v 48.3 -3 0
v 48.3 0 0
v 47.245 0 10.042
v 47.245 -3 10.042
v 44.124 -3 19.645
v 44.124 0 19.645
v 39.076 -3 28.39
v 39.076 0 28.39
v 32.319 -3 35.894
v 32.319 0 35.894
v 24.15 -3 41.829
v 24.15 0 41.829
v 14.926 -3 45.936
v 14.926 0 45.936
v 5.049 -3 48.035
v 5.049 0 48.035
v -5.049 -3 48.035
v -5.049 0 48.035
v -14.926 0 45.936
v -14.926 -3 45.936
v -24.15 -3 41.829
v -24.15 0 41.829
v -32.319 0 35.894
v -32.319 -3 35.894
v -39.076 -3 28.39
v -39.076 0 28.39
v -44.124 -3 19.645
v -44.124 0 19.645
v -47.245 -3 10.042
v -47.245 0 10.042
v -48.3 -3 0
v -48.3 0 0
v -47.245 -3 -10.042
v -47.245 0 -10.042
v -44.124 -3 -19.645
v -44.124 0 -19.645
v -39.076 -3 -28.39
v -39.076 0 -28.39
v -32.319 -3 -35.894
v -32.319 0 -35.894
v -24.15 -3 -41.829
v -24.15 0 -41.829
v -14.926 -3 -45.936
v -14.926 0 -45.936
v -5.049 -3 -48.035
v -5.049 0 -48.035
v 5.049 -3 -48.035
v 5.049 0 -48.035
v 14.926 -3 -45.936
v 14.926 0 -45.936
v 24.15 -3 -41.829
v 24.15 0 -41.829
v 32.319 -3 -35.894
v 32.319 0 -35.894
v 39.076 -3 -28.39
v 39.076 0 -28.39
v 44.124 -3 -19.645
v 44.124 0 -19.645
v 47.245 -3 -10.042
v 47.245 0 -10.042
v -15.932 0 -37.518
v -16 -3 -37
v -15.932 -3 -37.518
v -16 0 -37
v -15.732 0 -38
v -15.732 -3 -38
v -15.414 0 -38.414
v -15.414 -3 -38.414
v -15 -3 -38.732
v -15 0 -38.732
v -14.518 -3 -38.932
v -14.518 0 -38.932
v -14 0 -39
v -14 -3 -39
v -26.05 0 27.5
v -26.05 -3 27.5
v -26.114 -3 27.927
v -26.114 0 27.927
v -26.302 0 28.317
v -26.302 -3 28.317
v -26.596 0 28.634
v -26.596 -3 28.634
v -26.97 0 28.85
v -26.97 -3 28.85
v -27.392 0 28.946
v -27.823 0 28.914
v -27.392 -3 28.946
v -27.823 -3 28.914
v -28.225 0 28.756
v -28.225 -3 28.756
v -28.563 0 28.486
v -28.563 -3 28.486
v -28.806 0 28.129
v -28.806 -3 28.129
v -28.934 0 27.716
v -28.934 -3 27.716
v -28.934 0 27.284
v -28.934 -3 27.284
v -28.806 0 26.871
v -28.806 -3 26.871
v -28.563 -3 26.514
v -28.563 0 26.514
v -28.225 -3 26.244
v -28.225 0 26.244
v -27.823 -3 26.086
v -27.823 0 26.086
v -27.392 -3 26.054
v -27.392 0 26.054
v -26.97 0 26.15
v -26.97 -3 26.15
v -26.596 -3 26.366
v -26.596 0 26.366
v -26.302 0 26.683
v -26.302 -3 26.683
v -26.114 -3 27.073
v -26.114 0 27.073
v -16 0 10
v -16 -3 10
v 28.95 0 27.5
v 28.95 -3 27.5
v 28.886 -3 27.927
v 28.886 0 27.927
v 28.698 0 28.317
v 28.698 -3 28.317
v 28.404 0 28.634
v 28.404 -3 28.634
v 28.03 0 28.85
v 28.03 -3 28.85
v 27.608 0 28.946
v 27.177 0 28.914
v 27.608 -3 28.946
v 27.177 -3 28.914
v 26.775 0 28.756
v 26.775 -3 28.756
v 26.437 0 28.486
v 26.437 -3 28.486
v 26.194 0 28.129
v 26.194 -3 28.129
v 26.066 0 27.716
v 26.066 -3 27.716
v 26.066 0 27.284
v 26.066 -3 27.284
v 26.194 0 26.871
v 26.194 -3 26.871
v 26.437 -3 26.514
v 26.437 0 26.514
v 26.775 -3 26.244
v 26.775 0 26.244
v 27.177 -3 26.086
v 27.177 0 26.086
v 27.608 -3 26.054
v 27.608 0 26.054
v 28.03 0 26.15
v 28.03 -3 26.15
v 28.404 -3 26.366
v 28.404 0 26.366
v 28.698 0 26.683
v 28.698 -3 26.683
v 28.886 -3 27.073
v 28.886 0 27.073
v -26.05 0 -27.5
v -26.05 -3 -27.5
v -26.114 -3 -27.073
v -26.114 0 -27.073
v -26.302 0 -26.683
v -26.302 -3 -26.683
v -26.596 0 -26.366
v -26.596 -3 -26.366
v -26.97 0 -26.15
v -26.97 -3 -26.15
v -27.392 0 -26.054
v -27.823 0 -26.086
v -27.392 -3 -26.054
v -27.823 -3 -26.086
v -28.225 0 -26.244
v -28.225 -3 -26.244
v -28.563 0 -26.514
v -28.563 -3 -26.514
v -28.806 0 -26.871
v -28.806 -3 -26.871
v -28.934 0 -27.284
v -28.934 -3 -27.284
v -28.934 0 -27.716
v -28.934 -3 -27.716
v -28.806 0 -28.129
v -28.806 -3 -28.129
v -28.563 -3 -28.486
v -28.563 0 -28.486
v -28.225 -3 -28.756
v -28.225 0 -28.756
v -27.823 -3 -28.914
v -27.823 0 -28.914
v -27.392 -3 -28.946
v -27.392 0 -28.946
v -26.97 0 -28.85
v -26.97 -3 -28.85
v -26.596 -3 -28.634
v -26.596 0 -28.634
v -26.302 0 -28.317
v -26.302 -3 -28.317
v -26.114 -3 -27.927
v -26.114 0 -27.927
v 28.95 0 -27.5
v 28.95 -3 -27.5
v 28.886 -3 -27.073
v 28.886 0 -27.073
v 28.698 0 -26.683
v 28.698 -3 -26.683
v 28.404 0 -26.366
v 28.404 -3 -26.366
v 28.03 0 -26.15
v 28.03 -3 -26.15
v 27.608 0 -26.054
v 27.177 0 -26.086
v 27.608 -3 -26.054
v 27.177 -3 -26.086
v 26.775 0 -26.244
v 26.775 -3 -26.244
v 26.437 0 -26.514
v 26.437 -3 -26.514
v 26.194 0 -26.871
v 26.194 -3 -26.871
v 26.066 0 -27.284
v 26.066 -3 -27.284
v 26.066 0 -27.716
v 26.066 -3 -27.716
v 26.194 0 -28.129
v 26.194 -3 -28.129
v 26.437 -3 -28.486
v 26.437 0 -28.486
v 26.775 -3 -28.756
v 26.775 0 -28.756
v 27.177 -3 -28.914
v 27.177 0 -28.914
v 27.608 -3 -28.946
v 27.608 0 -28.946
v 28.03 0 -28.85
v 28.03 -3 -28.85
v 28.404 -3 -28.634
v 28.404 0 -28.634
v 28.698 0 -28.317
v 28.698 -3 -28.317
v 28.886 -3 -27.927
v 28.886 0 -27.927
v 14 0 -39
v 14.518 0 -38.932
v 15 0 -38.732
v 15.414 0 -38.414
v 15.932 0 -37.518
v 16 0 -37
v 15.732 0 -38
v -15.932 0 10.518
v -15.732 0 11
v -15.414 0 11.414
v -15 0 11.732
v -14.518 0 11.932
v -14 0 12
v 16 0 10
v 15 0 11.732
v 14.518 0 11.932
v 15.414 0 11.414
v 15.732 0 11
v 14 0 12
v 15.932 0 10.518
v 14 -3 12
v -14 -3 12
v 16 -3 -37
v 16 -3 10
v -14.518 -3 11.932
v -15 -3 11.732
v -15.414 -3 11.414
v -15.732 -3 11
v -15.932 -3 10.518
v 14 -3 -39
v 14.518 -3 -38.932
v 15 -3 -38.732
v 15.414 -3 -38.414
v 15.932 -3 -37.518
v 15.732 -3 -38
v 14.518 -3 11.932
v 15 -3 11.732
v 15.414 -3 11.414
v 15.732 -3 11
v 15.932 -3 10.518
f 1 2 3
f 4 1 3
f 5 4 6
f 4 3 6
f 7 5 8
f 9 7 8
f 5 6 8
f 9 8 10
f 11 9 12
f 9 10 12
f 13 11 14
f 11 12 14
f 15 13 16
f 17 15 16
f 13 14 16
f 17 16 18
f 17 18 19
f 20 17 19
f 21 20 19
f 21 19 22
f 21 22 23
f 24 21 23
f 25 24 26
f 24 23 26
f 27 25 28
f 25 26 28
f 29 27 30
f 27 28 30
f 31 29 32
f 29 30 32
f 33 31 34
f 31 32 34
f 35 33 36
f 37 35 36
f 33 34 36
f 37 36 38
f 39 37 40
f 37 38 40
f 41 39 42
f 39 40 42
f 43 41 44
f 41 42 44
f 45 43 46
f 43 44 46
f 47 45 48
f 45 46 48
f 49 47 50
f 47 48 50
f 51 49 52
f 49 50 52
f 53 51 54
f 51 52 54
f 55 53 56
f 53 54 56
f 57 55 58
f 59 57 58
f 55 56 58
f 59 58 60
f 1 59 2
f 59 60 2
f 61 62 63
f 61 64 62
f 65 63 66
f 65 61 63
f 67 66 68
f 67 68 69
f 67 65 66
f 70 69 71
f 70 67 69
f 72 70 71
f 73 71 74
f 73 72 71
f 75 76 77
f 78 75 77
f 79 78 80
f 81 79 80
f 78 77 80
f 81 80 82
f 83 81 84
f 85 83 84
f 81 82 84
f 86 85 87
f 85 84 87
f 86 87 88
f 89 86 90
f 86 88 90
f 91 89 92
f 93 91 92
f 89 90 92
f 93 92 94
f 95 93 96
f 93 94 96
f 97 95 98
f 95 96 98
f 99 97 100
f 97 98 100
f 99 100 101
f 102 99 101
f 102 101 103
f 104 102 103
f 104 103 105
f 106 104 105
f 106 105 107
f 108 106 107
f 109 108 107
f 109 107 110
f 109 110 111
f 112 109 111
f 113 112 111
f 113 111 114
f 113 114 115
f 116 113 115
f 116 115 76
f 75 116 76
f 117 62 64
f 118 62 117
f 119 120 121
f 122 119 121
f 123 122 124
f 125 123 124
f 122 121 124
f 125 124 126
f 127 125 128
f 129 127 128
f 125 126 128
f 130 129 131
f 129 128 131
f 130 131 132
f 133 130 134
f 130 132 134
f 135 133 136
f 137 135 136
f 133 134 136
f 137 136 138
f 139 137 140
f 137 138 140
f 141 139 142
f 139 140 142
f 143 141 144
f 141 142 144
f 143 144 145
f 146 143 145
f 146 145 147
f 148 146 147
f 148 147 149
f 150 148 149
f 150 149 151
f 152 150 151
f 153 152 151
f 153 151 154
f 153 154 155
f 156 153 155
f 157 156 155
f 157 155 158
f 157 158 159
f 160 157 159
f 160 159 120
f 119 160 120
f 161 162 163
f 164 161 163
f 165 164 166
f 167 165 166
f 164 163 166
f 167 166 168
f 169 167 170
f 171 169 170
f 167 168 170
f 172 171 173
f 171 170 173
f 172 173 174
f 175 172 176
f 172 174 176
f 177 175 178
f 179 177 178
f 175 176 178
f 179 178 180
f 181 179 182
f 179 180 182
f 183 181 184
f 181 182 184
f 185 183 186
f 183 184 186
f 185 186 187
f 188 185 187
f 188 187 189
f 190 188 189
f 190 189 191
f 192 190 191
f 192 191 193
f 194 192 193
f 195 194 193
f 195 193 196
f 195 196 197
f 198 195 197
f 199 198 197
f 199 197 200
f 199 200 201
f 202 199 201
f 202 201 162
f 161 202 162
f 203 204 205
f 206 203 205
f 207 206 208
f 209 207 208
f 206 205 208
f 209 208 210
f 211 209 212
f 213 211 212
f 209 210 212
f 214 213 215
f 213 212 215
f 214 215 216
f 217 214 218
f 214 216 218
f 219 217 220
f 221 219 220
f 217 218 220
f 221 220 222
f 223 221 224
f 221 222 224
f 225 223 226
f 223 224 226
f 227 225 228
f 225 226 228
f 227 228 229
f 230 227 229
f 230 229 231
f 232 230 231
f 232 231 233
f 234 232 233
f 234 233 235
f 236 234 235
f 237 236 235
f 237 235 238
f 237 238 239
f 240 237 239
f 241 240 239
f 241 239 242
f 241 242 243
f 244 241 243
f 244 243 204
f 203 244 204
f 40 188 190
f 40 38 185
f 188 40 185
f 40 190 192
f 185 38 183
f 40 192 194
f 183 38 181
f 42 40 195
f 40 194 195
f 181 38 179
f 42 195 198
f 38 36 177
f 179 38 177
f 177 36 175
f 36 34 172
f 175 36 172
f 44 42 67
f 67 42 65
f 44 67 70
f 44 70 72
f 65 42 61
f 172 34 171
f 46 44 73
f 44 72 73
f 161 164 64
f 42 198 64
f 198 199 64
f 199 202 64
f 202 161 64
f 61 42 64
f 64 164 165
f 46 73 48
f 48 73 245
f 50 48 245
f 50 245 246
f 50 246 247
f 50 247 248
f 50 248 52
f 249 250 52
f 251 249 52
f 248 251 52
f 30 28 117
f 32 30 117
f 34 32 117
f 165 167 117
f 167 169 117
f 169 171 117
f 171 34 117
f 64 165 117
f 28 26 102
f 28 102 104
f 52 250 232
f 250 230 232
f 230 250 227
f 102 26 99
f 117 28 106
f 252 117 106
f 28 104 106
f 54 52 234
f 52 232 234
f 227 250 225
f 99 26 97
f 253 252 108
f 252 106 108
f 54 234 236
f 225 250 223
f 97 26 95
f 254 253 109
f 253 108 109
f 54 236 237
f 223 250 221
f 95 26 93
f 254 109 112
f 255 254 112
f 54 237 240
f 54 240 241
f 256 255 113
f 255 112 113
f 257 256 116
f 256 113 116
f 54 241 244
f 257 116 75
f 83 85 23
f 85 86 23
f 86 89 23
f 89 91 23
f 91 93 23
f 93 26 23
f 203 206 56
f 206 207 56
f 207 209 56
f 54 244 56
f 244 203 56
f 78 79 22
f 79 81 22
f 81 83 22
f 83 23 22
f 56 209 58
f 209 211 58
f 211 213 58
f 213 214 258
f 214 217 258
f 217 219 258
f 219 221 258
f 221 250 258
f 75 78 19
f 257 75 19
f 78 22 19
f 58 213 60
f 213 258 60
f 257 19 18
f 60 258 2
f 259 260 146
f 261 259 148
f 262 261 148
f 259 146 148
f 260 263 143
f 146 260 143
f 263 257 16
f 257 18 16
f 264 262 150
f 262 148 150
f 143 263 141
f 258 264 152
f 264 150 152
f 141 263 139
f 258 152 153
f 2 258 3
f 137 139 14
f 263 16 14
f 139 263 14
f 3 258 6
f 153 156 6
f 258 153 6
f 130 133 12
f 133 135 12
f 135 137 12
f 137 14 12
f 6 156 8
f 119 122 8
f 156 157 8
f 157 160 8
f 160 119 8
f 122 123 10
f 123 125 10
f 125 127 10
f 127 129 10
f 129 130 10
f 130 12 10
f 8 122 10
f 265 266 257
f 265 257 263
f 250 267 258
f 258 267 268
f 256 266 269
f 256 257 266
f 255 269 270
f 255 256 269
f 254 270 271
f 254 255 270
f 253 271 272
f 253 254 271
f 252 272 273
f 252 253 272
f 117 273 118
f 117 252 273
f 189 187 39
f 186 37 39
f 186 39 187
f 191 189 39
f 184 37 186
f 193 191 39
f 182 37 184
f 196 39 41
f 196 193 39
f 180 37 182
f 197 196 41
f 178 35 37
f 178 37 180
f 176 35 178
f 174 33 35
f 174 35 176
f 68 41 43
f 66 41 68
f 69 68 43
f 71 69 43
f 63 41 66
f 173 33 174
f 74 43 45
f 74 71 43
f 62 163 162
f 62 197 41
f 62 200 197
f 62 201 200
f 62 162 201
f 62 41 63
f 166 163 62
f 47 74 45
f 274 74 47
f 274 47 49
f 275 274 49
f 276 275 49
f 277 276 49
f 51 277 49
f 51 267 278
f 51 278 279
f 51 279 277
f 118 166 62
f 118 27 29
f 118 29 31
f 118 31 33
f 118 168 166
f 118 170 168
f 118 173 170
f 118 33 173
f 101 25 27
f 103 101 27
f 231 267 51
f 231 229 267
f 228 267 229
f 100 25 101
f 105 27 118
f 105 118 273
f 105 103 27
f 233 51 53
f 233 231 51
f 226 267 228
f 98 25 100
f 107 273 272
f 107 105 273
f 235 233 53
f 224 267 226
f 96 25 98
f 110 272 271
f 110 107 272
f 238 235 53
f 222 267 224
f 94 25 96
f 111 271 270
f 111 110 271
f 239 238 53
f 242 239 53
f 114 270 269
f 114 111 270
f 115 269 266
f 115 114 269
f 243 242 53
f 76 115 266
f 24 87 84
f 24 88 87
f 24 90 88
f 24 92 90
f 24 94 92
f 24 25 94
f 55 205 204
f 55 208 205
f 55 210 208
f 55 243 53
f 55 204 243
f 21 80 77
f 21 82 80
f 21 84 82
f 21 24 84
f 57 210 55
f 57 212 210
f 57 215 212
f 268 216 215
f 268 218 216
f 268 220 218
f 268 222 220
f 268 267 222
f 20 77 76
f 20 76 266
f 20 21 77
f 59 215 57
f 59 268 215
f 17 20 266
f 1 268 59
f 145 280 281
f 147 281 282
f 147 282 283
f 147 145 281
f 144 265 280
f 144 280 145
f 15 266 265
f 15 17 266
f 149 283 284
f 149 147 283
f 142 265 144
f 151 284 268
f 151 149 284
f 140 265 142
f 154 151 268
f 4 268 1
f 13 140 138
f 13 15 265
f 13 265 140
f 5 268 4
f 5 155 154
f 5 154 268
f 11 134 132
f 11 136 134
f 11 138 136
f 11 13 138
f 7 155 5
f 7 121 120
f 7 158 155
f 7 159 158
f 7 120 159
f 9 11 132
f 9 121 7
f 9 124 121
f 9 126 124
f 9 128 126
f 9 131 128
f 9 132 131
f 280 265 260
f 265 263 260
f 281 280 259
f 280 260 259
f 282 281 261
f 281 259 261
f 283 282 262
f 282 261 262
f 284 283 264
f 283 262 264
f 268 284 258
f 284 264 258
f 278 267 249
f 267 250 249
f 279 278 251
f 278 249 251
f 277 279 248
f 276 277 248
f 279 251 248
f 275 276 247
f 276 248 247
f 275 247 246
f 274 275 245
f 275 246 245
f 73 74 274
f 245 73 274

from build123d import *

# Parameters (mm, degrees)
F0_R     = 48.3
F1_DEPTH = 3
F2_R     = 1.25
F2_R_2   = 2.5
F3_DEPTH = 3.001
F4_R     = 1.45
F5_DEPTH = 3.001
F6_R     = 1
F7_DEPTH = 3.001
F8_W     = 32
F8_H     = 51
F9_DEPTH = 3.001
F10_R    = 2
F11_R    = 2
F12_R    = 2


with BuildPart() as f1:
    # F0 (on Front) → F1 (new body)
    with BuildSketch(Plane.XZ):
        Circle(F0_R)
    extrude(amount=F1_DEPTH)

    # F2 (on face) → F3 (cut, through all)
    with BuildSketch(Plane.XZ.offset(3)):
        with Locations((-8, 0)):
            Circle(F2_R)
        with Locations((8, 0)):
            Circle(F2_R)
        Circle(F2_R_2)
    extrude(amount=-F3_DEPTH, mode=Mode.SUBTRACT)

    # F4 (on face) → F5 (cut, through all)
    with BuildSketch(Plane.XZ.offset(3)):
        with Locations((-27.5, 27.5)):
            Circle(F4_R)
        with Locations((27.5, 27.5)):
            Circle(F4_R)
        with Locations((-27.5, -27.5)):
            Circle(F4_R)
        with Locations((27.5, -27.5)):
            Circle(F4_R)
    extrude(amount=-F5_DEPTH, mode=Mode.SUBTRACT)

    # F6 (on face) → F7 (cut, through all)
    with BuildSketch(Plane.XZ.offset(3)):
        with BuildLine():
            Line((-10.05, -33), (10.05, -33))
            Line((10.05, -33), (10.05, -5.589946))
            ThreePointArc((10.05, -5.589946), (0, -11.5), (-10.05, -5.589946))
            Line((-10.05, -5.589946), (-10.05, -33))
        make_face()
        with BuildLine():
            Line((10.05, 0), (10.05, -5.589946))
            ThreePointArc((10.05, -5.589946), (11.131599, -2.887473), (11.5, 0))
            ThreePointArc((11.5, 0), (-2.887473, 11.131599), (-10.05, -5.589946))
            Line((-10.05, -5.589946), (-10.05, 0))
            Line((-10.05, 0), (10.05, 0))
        make_face()
        with Locations((-13.5, -6.5)):
            Circle(F6_R)
        with Locations((-13.5, -14.5)):
            Circle(F6_R)
        with Locations((-13.5, -22.5)):
            Circle(F6_R)
        with Locations((-13.5, -30.5)):
            Circle(F6_R)
        with Locations((13.5, -6.5)):
            Circle(F6_R)
        with Locations((13.5, -14.5)):
            Circle(F6_R)
        with Locations((13.5, -22.5)):
            Circle(F6_R)
        with Locations((13.5, -30.5)):
            Circle(F6_R)
        with Locations((-8, -36)):
            Circle(F6_R)
        with Locations((8, -36)):
            Circle(F6_R)
    extrude(amount=-F7_DEPTH, mode=Mode.SUBTRACT)

    # F8 (on face) → F9 (cut, through all)
    with BuildSketch(Plane.XZ.offset(3)):
        with Locations((0, -13.5)):
            Rectangle(F8_W, F8_H)
    extrude(amount=-F9_DEPTH, mode=Mode.SUBTRACT)

    # F10
    f10_edges = [f1.edges().sort_by_distance(p)[0] for p in [
        (-16, -1.5, 12),
    ]]
    fillet(f10_edges, radius=F10_R)

    # F11
    f11_edges = [f1.edges().sort_by_distance(p)[0] for p in [
        (16, -1.5, 12),
    ]]
    fillet(f11_edges, radius=F11_R)

    # F12
    f12_edges = [f1.edges().sort_by_distance(p)[0] for p in [
        (16, -1.5, -39),
        (-16, -1.5, -39),
    ]]
    fillet(f12_edges, radius=F12_R)


solid = f1.part
